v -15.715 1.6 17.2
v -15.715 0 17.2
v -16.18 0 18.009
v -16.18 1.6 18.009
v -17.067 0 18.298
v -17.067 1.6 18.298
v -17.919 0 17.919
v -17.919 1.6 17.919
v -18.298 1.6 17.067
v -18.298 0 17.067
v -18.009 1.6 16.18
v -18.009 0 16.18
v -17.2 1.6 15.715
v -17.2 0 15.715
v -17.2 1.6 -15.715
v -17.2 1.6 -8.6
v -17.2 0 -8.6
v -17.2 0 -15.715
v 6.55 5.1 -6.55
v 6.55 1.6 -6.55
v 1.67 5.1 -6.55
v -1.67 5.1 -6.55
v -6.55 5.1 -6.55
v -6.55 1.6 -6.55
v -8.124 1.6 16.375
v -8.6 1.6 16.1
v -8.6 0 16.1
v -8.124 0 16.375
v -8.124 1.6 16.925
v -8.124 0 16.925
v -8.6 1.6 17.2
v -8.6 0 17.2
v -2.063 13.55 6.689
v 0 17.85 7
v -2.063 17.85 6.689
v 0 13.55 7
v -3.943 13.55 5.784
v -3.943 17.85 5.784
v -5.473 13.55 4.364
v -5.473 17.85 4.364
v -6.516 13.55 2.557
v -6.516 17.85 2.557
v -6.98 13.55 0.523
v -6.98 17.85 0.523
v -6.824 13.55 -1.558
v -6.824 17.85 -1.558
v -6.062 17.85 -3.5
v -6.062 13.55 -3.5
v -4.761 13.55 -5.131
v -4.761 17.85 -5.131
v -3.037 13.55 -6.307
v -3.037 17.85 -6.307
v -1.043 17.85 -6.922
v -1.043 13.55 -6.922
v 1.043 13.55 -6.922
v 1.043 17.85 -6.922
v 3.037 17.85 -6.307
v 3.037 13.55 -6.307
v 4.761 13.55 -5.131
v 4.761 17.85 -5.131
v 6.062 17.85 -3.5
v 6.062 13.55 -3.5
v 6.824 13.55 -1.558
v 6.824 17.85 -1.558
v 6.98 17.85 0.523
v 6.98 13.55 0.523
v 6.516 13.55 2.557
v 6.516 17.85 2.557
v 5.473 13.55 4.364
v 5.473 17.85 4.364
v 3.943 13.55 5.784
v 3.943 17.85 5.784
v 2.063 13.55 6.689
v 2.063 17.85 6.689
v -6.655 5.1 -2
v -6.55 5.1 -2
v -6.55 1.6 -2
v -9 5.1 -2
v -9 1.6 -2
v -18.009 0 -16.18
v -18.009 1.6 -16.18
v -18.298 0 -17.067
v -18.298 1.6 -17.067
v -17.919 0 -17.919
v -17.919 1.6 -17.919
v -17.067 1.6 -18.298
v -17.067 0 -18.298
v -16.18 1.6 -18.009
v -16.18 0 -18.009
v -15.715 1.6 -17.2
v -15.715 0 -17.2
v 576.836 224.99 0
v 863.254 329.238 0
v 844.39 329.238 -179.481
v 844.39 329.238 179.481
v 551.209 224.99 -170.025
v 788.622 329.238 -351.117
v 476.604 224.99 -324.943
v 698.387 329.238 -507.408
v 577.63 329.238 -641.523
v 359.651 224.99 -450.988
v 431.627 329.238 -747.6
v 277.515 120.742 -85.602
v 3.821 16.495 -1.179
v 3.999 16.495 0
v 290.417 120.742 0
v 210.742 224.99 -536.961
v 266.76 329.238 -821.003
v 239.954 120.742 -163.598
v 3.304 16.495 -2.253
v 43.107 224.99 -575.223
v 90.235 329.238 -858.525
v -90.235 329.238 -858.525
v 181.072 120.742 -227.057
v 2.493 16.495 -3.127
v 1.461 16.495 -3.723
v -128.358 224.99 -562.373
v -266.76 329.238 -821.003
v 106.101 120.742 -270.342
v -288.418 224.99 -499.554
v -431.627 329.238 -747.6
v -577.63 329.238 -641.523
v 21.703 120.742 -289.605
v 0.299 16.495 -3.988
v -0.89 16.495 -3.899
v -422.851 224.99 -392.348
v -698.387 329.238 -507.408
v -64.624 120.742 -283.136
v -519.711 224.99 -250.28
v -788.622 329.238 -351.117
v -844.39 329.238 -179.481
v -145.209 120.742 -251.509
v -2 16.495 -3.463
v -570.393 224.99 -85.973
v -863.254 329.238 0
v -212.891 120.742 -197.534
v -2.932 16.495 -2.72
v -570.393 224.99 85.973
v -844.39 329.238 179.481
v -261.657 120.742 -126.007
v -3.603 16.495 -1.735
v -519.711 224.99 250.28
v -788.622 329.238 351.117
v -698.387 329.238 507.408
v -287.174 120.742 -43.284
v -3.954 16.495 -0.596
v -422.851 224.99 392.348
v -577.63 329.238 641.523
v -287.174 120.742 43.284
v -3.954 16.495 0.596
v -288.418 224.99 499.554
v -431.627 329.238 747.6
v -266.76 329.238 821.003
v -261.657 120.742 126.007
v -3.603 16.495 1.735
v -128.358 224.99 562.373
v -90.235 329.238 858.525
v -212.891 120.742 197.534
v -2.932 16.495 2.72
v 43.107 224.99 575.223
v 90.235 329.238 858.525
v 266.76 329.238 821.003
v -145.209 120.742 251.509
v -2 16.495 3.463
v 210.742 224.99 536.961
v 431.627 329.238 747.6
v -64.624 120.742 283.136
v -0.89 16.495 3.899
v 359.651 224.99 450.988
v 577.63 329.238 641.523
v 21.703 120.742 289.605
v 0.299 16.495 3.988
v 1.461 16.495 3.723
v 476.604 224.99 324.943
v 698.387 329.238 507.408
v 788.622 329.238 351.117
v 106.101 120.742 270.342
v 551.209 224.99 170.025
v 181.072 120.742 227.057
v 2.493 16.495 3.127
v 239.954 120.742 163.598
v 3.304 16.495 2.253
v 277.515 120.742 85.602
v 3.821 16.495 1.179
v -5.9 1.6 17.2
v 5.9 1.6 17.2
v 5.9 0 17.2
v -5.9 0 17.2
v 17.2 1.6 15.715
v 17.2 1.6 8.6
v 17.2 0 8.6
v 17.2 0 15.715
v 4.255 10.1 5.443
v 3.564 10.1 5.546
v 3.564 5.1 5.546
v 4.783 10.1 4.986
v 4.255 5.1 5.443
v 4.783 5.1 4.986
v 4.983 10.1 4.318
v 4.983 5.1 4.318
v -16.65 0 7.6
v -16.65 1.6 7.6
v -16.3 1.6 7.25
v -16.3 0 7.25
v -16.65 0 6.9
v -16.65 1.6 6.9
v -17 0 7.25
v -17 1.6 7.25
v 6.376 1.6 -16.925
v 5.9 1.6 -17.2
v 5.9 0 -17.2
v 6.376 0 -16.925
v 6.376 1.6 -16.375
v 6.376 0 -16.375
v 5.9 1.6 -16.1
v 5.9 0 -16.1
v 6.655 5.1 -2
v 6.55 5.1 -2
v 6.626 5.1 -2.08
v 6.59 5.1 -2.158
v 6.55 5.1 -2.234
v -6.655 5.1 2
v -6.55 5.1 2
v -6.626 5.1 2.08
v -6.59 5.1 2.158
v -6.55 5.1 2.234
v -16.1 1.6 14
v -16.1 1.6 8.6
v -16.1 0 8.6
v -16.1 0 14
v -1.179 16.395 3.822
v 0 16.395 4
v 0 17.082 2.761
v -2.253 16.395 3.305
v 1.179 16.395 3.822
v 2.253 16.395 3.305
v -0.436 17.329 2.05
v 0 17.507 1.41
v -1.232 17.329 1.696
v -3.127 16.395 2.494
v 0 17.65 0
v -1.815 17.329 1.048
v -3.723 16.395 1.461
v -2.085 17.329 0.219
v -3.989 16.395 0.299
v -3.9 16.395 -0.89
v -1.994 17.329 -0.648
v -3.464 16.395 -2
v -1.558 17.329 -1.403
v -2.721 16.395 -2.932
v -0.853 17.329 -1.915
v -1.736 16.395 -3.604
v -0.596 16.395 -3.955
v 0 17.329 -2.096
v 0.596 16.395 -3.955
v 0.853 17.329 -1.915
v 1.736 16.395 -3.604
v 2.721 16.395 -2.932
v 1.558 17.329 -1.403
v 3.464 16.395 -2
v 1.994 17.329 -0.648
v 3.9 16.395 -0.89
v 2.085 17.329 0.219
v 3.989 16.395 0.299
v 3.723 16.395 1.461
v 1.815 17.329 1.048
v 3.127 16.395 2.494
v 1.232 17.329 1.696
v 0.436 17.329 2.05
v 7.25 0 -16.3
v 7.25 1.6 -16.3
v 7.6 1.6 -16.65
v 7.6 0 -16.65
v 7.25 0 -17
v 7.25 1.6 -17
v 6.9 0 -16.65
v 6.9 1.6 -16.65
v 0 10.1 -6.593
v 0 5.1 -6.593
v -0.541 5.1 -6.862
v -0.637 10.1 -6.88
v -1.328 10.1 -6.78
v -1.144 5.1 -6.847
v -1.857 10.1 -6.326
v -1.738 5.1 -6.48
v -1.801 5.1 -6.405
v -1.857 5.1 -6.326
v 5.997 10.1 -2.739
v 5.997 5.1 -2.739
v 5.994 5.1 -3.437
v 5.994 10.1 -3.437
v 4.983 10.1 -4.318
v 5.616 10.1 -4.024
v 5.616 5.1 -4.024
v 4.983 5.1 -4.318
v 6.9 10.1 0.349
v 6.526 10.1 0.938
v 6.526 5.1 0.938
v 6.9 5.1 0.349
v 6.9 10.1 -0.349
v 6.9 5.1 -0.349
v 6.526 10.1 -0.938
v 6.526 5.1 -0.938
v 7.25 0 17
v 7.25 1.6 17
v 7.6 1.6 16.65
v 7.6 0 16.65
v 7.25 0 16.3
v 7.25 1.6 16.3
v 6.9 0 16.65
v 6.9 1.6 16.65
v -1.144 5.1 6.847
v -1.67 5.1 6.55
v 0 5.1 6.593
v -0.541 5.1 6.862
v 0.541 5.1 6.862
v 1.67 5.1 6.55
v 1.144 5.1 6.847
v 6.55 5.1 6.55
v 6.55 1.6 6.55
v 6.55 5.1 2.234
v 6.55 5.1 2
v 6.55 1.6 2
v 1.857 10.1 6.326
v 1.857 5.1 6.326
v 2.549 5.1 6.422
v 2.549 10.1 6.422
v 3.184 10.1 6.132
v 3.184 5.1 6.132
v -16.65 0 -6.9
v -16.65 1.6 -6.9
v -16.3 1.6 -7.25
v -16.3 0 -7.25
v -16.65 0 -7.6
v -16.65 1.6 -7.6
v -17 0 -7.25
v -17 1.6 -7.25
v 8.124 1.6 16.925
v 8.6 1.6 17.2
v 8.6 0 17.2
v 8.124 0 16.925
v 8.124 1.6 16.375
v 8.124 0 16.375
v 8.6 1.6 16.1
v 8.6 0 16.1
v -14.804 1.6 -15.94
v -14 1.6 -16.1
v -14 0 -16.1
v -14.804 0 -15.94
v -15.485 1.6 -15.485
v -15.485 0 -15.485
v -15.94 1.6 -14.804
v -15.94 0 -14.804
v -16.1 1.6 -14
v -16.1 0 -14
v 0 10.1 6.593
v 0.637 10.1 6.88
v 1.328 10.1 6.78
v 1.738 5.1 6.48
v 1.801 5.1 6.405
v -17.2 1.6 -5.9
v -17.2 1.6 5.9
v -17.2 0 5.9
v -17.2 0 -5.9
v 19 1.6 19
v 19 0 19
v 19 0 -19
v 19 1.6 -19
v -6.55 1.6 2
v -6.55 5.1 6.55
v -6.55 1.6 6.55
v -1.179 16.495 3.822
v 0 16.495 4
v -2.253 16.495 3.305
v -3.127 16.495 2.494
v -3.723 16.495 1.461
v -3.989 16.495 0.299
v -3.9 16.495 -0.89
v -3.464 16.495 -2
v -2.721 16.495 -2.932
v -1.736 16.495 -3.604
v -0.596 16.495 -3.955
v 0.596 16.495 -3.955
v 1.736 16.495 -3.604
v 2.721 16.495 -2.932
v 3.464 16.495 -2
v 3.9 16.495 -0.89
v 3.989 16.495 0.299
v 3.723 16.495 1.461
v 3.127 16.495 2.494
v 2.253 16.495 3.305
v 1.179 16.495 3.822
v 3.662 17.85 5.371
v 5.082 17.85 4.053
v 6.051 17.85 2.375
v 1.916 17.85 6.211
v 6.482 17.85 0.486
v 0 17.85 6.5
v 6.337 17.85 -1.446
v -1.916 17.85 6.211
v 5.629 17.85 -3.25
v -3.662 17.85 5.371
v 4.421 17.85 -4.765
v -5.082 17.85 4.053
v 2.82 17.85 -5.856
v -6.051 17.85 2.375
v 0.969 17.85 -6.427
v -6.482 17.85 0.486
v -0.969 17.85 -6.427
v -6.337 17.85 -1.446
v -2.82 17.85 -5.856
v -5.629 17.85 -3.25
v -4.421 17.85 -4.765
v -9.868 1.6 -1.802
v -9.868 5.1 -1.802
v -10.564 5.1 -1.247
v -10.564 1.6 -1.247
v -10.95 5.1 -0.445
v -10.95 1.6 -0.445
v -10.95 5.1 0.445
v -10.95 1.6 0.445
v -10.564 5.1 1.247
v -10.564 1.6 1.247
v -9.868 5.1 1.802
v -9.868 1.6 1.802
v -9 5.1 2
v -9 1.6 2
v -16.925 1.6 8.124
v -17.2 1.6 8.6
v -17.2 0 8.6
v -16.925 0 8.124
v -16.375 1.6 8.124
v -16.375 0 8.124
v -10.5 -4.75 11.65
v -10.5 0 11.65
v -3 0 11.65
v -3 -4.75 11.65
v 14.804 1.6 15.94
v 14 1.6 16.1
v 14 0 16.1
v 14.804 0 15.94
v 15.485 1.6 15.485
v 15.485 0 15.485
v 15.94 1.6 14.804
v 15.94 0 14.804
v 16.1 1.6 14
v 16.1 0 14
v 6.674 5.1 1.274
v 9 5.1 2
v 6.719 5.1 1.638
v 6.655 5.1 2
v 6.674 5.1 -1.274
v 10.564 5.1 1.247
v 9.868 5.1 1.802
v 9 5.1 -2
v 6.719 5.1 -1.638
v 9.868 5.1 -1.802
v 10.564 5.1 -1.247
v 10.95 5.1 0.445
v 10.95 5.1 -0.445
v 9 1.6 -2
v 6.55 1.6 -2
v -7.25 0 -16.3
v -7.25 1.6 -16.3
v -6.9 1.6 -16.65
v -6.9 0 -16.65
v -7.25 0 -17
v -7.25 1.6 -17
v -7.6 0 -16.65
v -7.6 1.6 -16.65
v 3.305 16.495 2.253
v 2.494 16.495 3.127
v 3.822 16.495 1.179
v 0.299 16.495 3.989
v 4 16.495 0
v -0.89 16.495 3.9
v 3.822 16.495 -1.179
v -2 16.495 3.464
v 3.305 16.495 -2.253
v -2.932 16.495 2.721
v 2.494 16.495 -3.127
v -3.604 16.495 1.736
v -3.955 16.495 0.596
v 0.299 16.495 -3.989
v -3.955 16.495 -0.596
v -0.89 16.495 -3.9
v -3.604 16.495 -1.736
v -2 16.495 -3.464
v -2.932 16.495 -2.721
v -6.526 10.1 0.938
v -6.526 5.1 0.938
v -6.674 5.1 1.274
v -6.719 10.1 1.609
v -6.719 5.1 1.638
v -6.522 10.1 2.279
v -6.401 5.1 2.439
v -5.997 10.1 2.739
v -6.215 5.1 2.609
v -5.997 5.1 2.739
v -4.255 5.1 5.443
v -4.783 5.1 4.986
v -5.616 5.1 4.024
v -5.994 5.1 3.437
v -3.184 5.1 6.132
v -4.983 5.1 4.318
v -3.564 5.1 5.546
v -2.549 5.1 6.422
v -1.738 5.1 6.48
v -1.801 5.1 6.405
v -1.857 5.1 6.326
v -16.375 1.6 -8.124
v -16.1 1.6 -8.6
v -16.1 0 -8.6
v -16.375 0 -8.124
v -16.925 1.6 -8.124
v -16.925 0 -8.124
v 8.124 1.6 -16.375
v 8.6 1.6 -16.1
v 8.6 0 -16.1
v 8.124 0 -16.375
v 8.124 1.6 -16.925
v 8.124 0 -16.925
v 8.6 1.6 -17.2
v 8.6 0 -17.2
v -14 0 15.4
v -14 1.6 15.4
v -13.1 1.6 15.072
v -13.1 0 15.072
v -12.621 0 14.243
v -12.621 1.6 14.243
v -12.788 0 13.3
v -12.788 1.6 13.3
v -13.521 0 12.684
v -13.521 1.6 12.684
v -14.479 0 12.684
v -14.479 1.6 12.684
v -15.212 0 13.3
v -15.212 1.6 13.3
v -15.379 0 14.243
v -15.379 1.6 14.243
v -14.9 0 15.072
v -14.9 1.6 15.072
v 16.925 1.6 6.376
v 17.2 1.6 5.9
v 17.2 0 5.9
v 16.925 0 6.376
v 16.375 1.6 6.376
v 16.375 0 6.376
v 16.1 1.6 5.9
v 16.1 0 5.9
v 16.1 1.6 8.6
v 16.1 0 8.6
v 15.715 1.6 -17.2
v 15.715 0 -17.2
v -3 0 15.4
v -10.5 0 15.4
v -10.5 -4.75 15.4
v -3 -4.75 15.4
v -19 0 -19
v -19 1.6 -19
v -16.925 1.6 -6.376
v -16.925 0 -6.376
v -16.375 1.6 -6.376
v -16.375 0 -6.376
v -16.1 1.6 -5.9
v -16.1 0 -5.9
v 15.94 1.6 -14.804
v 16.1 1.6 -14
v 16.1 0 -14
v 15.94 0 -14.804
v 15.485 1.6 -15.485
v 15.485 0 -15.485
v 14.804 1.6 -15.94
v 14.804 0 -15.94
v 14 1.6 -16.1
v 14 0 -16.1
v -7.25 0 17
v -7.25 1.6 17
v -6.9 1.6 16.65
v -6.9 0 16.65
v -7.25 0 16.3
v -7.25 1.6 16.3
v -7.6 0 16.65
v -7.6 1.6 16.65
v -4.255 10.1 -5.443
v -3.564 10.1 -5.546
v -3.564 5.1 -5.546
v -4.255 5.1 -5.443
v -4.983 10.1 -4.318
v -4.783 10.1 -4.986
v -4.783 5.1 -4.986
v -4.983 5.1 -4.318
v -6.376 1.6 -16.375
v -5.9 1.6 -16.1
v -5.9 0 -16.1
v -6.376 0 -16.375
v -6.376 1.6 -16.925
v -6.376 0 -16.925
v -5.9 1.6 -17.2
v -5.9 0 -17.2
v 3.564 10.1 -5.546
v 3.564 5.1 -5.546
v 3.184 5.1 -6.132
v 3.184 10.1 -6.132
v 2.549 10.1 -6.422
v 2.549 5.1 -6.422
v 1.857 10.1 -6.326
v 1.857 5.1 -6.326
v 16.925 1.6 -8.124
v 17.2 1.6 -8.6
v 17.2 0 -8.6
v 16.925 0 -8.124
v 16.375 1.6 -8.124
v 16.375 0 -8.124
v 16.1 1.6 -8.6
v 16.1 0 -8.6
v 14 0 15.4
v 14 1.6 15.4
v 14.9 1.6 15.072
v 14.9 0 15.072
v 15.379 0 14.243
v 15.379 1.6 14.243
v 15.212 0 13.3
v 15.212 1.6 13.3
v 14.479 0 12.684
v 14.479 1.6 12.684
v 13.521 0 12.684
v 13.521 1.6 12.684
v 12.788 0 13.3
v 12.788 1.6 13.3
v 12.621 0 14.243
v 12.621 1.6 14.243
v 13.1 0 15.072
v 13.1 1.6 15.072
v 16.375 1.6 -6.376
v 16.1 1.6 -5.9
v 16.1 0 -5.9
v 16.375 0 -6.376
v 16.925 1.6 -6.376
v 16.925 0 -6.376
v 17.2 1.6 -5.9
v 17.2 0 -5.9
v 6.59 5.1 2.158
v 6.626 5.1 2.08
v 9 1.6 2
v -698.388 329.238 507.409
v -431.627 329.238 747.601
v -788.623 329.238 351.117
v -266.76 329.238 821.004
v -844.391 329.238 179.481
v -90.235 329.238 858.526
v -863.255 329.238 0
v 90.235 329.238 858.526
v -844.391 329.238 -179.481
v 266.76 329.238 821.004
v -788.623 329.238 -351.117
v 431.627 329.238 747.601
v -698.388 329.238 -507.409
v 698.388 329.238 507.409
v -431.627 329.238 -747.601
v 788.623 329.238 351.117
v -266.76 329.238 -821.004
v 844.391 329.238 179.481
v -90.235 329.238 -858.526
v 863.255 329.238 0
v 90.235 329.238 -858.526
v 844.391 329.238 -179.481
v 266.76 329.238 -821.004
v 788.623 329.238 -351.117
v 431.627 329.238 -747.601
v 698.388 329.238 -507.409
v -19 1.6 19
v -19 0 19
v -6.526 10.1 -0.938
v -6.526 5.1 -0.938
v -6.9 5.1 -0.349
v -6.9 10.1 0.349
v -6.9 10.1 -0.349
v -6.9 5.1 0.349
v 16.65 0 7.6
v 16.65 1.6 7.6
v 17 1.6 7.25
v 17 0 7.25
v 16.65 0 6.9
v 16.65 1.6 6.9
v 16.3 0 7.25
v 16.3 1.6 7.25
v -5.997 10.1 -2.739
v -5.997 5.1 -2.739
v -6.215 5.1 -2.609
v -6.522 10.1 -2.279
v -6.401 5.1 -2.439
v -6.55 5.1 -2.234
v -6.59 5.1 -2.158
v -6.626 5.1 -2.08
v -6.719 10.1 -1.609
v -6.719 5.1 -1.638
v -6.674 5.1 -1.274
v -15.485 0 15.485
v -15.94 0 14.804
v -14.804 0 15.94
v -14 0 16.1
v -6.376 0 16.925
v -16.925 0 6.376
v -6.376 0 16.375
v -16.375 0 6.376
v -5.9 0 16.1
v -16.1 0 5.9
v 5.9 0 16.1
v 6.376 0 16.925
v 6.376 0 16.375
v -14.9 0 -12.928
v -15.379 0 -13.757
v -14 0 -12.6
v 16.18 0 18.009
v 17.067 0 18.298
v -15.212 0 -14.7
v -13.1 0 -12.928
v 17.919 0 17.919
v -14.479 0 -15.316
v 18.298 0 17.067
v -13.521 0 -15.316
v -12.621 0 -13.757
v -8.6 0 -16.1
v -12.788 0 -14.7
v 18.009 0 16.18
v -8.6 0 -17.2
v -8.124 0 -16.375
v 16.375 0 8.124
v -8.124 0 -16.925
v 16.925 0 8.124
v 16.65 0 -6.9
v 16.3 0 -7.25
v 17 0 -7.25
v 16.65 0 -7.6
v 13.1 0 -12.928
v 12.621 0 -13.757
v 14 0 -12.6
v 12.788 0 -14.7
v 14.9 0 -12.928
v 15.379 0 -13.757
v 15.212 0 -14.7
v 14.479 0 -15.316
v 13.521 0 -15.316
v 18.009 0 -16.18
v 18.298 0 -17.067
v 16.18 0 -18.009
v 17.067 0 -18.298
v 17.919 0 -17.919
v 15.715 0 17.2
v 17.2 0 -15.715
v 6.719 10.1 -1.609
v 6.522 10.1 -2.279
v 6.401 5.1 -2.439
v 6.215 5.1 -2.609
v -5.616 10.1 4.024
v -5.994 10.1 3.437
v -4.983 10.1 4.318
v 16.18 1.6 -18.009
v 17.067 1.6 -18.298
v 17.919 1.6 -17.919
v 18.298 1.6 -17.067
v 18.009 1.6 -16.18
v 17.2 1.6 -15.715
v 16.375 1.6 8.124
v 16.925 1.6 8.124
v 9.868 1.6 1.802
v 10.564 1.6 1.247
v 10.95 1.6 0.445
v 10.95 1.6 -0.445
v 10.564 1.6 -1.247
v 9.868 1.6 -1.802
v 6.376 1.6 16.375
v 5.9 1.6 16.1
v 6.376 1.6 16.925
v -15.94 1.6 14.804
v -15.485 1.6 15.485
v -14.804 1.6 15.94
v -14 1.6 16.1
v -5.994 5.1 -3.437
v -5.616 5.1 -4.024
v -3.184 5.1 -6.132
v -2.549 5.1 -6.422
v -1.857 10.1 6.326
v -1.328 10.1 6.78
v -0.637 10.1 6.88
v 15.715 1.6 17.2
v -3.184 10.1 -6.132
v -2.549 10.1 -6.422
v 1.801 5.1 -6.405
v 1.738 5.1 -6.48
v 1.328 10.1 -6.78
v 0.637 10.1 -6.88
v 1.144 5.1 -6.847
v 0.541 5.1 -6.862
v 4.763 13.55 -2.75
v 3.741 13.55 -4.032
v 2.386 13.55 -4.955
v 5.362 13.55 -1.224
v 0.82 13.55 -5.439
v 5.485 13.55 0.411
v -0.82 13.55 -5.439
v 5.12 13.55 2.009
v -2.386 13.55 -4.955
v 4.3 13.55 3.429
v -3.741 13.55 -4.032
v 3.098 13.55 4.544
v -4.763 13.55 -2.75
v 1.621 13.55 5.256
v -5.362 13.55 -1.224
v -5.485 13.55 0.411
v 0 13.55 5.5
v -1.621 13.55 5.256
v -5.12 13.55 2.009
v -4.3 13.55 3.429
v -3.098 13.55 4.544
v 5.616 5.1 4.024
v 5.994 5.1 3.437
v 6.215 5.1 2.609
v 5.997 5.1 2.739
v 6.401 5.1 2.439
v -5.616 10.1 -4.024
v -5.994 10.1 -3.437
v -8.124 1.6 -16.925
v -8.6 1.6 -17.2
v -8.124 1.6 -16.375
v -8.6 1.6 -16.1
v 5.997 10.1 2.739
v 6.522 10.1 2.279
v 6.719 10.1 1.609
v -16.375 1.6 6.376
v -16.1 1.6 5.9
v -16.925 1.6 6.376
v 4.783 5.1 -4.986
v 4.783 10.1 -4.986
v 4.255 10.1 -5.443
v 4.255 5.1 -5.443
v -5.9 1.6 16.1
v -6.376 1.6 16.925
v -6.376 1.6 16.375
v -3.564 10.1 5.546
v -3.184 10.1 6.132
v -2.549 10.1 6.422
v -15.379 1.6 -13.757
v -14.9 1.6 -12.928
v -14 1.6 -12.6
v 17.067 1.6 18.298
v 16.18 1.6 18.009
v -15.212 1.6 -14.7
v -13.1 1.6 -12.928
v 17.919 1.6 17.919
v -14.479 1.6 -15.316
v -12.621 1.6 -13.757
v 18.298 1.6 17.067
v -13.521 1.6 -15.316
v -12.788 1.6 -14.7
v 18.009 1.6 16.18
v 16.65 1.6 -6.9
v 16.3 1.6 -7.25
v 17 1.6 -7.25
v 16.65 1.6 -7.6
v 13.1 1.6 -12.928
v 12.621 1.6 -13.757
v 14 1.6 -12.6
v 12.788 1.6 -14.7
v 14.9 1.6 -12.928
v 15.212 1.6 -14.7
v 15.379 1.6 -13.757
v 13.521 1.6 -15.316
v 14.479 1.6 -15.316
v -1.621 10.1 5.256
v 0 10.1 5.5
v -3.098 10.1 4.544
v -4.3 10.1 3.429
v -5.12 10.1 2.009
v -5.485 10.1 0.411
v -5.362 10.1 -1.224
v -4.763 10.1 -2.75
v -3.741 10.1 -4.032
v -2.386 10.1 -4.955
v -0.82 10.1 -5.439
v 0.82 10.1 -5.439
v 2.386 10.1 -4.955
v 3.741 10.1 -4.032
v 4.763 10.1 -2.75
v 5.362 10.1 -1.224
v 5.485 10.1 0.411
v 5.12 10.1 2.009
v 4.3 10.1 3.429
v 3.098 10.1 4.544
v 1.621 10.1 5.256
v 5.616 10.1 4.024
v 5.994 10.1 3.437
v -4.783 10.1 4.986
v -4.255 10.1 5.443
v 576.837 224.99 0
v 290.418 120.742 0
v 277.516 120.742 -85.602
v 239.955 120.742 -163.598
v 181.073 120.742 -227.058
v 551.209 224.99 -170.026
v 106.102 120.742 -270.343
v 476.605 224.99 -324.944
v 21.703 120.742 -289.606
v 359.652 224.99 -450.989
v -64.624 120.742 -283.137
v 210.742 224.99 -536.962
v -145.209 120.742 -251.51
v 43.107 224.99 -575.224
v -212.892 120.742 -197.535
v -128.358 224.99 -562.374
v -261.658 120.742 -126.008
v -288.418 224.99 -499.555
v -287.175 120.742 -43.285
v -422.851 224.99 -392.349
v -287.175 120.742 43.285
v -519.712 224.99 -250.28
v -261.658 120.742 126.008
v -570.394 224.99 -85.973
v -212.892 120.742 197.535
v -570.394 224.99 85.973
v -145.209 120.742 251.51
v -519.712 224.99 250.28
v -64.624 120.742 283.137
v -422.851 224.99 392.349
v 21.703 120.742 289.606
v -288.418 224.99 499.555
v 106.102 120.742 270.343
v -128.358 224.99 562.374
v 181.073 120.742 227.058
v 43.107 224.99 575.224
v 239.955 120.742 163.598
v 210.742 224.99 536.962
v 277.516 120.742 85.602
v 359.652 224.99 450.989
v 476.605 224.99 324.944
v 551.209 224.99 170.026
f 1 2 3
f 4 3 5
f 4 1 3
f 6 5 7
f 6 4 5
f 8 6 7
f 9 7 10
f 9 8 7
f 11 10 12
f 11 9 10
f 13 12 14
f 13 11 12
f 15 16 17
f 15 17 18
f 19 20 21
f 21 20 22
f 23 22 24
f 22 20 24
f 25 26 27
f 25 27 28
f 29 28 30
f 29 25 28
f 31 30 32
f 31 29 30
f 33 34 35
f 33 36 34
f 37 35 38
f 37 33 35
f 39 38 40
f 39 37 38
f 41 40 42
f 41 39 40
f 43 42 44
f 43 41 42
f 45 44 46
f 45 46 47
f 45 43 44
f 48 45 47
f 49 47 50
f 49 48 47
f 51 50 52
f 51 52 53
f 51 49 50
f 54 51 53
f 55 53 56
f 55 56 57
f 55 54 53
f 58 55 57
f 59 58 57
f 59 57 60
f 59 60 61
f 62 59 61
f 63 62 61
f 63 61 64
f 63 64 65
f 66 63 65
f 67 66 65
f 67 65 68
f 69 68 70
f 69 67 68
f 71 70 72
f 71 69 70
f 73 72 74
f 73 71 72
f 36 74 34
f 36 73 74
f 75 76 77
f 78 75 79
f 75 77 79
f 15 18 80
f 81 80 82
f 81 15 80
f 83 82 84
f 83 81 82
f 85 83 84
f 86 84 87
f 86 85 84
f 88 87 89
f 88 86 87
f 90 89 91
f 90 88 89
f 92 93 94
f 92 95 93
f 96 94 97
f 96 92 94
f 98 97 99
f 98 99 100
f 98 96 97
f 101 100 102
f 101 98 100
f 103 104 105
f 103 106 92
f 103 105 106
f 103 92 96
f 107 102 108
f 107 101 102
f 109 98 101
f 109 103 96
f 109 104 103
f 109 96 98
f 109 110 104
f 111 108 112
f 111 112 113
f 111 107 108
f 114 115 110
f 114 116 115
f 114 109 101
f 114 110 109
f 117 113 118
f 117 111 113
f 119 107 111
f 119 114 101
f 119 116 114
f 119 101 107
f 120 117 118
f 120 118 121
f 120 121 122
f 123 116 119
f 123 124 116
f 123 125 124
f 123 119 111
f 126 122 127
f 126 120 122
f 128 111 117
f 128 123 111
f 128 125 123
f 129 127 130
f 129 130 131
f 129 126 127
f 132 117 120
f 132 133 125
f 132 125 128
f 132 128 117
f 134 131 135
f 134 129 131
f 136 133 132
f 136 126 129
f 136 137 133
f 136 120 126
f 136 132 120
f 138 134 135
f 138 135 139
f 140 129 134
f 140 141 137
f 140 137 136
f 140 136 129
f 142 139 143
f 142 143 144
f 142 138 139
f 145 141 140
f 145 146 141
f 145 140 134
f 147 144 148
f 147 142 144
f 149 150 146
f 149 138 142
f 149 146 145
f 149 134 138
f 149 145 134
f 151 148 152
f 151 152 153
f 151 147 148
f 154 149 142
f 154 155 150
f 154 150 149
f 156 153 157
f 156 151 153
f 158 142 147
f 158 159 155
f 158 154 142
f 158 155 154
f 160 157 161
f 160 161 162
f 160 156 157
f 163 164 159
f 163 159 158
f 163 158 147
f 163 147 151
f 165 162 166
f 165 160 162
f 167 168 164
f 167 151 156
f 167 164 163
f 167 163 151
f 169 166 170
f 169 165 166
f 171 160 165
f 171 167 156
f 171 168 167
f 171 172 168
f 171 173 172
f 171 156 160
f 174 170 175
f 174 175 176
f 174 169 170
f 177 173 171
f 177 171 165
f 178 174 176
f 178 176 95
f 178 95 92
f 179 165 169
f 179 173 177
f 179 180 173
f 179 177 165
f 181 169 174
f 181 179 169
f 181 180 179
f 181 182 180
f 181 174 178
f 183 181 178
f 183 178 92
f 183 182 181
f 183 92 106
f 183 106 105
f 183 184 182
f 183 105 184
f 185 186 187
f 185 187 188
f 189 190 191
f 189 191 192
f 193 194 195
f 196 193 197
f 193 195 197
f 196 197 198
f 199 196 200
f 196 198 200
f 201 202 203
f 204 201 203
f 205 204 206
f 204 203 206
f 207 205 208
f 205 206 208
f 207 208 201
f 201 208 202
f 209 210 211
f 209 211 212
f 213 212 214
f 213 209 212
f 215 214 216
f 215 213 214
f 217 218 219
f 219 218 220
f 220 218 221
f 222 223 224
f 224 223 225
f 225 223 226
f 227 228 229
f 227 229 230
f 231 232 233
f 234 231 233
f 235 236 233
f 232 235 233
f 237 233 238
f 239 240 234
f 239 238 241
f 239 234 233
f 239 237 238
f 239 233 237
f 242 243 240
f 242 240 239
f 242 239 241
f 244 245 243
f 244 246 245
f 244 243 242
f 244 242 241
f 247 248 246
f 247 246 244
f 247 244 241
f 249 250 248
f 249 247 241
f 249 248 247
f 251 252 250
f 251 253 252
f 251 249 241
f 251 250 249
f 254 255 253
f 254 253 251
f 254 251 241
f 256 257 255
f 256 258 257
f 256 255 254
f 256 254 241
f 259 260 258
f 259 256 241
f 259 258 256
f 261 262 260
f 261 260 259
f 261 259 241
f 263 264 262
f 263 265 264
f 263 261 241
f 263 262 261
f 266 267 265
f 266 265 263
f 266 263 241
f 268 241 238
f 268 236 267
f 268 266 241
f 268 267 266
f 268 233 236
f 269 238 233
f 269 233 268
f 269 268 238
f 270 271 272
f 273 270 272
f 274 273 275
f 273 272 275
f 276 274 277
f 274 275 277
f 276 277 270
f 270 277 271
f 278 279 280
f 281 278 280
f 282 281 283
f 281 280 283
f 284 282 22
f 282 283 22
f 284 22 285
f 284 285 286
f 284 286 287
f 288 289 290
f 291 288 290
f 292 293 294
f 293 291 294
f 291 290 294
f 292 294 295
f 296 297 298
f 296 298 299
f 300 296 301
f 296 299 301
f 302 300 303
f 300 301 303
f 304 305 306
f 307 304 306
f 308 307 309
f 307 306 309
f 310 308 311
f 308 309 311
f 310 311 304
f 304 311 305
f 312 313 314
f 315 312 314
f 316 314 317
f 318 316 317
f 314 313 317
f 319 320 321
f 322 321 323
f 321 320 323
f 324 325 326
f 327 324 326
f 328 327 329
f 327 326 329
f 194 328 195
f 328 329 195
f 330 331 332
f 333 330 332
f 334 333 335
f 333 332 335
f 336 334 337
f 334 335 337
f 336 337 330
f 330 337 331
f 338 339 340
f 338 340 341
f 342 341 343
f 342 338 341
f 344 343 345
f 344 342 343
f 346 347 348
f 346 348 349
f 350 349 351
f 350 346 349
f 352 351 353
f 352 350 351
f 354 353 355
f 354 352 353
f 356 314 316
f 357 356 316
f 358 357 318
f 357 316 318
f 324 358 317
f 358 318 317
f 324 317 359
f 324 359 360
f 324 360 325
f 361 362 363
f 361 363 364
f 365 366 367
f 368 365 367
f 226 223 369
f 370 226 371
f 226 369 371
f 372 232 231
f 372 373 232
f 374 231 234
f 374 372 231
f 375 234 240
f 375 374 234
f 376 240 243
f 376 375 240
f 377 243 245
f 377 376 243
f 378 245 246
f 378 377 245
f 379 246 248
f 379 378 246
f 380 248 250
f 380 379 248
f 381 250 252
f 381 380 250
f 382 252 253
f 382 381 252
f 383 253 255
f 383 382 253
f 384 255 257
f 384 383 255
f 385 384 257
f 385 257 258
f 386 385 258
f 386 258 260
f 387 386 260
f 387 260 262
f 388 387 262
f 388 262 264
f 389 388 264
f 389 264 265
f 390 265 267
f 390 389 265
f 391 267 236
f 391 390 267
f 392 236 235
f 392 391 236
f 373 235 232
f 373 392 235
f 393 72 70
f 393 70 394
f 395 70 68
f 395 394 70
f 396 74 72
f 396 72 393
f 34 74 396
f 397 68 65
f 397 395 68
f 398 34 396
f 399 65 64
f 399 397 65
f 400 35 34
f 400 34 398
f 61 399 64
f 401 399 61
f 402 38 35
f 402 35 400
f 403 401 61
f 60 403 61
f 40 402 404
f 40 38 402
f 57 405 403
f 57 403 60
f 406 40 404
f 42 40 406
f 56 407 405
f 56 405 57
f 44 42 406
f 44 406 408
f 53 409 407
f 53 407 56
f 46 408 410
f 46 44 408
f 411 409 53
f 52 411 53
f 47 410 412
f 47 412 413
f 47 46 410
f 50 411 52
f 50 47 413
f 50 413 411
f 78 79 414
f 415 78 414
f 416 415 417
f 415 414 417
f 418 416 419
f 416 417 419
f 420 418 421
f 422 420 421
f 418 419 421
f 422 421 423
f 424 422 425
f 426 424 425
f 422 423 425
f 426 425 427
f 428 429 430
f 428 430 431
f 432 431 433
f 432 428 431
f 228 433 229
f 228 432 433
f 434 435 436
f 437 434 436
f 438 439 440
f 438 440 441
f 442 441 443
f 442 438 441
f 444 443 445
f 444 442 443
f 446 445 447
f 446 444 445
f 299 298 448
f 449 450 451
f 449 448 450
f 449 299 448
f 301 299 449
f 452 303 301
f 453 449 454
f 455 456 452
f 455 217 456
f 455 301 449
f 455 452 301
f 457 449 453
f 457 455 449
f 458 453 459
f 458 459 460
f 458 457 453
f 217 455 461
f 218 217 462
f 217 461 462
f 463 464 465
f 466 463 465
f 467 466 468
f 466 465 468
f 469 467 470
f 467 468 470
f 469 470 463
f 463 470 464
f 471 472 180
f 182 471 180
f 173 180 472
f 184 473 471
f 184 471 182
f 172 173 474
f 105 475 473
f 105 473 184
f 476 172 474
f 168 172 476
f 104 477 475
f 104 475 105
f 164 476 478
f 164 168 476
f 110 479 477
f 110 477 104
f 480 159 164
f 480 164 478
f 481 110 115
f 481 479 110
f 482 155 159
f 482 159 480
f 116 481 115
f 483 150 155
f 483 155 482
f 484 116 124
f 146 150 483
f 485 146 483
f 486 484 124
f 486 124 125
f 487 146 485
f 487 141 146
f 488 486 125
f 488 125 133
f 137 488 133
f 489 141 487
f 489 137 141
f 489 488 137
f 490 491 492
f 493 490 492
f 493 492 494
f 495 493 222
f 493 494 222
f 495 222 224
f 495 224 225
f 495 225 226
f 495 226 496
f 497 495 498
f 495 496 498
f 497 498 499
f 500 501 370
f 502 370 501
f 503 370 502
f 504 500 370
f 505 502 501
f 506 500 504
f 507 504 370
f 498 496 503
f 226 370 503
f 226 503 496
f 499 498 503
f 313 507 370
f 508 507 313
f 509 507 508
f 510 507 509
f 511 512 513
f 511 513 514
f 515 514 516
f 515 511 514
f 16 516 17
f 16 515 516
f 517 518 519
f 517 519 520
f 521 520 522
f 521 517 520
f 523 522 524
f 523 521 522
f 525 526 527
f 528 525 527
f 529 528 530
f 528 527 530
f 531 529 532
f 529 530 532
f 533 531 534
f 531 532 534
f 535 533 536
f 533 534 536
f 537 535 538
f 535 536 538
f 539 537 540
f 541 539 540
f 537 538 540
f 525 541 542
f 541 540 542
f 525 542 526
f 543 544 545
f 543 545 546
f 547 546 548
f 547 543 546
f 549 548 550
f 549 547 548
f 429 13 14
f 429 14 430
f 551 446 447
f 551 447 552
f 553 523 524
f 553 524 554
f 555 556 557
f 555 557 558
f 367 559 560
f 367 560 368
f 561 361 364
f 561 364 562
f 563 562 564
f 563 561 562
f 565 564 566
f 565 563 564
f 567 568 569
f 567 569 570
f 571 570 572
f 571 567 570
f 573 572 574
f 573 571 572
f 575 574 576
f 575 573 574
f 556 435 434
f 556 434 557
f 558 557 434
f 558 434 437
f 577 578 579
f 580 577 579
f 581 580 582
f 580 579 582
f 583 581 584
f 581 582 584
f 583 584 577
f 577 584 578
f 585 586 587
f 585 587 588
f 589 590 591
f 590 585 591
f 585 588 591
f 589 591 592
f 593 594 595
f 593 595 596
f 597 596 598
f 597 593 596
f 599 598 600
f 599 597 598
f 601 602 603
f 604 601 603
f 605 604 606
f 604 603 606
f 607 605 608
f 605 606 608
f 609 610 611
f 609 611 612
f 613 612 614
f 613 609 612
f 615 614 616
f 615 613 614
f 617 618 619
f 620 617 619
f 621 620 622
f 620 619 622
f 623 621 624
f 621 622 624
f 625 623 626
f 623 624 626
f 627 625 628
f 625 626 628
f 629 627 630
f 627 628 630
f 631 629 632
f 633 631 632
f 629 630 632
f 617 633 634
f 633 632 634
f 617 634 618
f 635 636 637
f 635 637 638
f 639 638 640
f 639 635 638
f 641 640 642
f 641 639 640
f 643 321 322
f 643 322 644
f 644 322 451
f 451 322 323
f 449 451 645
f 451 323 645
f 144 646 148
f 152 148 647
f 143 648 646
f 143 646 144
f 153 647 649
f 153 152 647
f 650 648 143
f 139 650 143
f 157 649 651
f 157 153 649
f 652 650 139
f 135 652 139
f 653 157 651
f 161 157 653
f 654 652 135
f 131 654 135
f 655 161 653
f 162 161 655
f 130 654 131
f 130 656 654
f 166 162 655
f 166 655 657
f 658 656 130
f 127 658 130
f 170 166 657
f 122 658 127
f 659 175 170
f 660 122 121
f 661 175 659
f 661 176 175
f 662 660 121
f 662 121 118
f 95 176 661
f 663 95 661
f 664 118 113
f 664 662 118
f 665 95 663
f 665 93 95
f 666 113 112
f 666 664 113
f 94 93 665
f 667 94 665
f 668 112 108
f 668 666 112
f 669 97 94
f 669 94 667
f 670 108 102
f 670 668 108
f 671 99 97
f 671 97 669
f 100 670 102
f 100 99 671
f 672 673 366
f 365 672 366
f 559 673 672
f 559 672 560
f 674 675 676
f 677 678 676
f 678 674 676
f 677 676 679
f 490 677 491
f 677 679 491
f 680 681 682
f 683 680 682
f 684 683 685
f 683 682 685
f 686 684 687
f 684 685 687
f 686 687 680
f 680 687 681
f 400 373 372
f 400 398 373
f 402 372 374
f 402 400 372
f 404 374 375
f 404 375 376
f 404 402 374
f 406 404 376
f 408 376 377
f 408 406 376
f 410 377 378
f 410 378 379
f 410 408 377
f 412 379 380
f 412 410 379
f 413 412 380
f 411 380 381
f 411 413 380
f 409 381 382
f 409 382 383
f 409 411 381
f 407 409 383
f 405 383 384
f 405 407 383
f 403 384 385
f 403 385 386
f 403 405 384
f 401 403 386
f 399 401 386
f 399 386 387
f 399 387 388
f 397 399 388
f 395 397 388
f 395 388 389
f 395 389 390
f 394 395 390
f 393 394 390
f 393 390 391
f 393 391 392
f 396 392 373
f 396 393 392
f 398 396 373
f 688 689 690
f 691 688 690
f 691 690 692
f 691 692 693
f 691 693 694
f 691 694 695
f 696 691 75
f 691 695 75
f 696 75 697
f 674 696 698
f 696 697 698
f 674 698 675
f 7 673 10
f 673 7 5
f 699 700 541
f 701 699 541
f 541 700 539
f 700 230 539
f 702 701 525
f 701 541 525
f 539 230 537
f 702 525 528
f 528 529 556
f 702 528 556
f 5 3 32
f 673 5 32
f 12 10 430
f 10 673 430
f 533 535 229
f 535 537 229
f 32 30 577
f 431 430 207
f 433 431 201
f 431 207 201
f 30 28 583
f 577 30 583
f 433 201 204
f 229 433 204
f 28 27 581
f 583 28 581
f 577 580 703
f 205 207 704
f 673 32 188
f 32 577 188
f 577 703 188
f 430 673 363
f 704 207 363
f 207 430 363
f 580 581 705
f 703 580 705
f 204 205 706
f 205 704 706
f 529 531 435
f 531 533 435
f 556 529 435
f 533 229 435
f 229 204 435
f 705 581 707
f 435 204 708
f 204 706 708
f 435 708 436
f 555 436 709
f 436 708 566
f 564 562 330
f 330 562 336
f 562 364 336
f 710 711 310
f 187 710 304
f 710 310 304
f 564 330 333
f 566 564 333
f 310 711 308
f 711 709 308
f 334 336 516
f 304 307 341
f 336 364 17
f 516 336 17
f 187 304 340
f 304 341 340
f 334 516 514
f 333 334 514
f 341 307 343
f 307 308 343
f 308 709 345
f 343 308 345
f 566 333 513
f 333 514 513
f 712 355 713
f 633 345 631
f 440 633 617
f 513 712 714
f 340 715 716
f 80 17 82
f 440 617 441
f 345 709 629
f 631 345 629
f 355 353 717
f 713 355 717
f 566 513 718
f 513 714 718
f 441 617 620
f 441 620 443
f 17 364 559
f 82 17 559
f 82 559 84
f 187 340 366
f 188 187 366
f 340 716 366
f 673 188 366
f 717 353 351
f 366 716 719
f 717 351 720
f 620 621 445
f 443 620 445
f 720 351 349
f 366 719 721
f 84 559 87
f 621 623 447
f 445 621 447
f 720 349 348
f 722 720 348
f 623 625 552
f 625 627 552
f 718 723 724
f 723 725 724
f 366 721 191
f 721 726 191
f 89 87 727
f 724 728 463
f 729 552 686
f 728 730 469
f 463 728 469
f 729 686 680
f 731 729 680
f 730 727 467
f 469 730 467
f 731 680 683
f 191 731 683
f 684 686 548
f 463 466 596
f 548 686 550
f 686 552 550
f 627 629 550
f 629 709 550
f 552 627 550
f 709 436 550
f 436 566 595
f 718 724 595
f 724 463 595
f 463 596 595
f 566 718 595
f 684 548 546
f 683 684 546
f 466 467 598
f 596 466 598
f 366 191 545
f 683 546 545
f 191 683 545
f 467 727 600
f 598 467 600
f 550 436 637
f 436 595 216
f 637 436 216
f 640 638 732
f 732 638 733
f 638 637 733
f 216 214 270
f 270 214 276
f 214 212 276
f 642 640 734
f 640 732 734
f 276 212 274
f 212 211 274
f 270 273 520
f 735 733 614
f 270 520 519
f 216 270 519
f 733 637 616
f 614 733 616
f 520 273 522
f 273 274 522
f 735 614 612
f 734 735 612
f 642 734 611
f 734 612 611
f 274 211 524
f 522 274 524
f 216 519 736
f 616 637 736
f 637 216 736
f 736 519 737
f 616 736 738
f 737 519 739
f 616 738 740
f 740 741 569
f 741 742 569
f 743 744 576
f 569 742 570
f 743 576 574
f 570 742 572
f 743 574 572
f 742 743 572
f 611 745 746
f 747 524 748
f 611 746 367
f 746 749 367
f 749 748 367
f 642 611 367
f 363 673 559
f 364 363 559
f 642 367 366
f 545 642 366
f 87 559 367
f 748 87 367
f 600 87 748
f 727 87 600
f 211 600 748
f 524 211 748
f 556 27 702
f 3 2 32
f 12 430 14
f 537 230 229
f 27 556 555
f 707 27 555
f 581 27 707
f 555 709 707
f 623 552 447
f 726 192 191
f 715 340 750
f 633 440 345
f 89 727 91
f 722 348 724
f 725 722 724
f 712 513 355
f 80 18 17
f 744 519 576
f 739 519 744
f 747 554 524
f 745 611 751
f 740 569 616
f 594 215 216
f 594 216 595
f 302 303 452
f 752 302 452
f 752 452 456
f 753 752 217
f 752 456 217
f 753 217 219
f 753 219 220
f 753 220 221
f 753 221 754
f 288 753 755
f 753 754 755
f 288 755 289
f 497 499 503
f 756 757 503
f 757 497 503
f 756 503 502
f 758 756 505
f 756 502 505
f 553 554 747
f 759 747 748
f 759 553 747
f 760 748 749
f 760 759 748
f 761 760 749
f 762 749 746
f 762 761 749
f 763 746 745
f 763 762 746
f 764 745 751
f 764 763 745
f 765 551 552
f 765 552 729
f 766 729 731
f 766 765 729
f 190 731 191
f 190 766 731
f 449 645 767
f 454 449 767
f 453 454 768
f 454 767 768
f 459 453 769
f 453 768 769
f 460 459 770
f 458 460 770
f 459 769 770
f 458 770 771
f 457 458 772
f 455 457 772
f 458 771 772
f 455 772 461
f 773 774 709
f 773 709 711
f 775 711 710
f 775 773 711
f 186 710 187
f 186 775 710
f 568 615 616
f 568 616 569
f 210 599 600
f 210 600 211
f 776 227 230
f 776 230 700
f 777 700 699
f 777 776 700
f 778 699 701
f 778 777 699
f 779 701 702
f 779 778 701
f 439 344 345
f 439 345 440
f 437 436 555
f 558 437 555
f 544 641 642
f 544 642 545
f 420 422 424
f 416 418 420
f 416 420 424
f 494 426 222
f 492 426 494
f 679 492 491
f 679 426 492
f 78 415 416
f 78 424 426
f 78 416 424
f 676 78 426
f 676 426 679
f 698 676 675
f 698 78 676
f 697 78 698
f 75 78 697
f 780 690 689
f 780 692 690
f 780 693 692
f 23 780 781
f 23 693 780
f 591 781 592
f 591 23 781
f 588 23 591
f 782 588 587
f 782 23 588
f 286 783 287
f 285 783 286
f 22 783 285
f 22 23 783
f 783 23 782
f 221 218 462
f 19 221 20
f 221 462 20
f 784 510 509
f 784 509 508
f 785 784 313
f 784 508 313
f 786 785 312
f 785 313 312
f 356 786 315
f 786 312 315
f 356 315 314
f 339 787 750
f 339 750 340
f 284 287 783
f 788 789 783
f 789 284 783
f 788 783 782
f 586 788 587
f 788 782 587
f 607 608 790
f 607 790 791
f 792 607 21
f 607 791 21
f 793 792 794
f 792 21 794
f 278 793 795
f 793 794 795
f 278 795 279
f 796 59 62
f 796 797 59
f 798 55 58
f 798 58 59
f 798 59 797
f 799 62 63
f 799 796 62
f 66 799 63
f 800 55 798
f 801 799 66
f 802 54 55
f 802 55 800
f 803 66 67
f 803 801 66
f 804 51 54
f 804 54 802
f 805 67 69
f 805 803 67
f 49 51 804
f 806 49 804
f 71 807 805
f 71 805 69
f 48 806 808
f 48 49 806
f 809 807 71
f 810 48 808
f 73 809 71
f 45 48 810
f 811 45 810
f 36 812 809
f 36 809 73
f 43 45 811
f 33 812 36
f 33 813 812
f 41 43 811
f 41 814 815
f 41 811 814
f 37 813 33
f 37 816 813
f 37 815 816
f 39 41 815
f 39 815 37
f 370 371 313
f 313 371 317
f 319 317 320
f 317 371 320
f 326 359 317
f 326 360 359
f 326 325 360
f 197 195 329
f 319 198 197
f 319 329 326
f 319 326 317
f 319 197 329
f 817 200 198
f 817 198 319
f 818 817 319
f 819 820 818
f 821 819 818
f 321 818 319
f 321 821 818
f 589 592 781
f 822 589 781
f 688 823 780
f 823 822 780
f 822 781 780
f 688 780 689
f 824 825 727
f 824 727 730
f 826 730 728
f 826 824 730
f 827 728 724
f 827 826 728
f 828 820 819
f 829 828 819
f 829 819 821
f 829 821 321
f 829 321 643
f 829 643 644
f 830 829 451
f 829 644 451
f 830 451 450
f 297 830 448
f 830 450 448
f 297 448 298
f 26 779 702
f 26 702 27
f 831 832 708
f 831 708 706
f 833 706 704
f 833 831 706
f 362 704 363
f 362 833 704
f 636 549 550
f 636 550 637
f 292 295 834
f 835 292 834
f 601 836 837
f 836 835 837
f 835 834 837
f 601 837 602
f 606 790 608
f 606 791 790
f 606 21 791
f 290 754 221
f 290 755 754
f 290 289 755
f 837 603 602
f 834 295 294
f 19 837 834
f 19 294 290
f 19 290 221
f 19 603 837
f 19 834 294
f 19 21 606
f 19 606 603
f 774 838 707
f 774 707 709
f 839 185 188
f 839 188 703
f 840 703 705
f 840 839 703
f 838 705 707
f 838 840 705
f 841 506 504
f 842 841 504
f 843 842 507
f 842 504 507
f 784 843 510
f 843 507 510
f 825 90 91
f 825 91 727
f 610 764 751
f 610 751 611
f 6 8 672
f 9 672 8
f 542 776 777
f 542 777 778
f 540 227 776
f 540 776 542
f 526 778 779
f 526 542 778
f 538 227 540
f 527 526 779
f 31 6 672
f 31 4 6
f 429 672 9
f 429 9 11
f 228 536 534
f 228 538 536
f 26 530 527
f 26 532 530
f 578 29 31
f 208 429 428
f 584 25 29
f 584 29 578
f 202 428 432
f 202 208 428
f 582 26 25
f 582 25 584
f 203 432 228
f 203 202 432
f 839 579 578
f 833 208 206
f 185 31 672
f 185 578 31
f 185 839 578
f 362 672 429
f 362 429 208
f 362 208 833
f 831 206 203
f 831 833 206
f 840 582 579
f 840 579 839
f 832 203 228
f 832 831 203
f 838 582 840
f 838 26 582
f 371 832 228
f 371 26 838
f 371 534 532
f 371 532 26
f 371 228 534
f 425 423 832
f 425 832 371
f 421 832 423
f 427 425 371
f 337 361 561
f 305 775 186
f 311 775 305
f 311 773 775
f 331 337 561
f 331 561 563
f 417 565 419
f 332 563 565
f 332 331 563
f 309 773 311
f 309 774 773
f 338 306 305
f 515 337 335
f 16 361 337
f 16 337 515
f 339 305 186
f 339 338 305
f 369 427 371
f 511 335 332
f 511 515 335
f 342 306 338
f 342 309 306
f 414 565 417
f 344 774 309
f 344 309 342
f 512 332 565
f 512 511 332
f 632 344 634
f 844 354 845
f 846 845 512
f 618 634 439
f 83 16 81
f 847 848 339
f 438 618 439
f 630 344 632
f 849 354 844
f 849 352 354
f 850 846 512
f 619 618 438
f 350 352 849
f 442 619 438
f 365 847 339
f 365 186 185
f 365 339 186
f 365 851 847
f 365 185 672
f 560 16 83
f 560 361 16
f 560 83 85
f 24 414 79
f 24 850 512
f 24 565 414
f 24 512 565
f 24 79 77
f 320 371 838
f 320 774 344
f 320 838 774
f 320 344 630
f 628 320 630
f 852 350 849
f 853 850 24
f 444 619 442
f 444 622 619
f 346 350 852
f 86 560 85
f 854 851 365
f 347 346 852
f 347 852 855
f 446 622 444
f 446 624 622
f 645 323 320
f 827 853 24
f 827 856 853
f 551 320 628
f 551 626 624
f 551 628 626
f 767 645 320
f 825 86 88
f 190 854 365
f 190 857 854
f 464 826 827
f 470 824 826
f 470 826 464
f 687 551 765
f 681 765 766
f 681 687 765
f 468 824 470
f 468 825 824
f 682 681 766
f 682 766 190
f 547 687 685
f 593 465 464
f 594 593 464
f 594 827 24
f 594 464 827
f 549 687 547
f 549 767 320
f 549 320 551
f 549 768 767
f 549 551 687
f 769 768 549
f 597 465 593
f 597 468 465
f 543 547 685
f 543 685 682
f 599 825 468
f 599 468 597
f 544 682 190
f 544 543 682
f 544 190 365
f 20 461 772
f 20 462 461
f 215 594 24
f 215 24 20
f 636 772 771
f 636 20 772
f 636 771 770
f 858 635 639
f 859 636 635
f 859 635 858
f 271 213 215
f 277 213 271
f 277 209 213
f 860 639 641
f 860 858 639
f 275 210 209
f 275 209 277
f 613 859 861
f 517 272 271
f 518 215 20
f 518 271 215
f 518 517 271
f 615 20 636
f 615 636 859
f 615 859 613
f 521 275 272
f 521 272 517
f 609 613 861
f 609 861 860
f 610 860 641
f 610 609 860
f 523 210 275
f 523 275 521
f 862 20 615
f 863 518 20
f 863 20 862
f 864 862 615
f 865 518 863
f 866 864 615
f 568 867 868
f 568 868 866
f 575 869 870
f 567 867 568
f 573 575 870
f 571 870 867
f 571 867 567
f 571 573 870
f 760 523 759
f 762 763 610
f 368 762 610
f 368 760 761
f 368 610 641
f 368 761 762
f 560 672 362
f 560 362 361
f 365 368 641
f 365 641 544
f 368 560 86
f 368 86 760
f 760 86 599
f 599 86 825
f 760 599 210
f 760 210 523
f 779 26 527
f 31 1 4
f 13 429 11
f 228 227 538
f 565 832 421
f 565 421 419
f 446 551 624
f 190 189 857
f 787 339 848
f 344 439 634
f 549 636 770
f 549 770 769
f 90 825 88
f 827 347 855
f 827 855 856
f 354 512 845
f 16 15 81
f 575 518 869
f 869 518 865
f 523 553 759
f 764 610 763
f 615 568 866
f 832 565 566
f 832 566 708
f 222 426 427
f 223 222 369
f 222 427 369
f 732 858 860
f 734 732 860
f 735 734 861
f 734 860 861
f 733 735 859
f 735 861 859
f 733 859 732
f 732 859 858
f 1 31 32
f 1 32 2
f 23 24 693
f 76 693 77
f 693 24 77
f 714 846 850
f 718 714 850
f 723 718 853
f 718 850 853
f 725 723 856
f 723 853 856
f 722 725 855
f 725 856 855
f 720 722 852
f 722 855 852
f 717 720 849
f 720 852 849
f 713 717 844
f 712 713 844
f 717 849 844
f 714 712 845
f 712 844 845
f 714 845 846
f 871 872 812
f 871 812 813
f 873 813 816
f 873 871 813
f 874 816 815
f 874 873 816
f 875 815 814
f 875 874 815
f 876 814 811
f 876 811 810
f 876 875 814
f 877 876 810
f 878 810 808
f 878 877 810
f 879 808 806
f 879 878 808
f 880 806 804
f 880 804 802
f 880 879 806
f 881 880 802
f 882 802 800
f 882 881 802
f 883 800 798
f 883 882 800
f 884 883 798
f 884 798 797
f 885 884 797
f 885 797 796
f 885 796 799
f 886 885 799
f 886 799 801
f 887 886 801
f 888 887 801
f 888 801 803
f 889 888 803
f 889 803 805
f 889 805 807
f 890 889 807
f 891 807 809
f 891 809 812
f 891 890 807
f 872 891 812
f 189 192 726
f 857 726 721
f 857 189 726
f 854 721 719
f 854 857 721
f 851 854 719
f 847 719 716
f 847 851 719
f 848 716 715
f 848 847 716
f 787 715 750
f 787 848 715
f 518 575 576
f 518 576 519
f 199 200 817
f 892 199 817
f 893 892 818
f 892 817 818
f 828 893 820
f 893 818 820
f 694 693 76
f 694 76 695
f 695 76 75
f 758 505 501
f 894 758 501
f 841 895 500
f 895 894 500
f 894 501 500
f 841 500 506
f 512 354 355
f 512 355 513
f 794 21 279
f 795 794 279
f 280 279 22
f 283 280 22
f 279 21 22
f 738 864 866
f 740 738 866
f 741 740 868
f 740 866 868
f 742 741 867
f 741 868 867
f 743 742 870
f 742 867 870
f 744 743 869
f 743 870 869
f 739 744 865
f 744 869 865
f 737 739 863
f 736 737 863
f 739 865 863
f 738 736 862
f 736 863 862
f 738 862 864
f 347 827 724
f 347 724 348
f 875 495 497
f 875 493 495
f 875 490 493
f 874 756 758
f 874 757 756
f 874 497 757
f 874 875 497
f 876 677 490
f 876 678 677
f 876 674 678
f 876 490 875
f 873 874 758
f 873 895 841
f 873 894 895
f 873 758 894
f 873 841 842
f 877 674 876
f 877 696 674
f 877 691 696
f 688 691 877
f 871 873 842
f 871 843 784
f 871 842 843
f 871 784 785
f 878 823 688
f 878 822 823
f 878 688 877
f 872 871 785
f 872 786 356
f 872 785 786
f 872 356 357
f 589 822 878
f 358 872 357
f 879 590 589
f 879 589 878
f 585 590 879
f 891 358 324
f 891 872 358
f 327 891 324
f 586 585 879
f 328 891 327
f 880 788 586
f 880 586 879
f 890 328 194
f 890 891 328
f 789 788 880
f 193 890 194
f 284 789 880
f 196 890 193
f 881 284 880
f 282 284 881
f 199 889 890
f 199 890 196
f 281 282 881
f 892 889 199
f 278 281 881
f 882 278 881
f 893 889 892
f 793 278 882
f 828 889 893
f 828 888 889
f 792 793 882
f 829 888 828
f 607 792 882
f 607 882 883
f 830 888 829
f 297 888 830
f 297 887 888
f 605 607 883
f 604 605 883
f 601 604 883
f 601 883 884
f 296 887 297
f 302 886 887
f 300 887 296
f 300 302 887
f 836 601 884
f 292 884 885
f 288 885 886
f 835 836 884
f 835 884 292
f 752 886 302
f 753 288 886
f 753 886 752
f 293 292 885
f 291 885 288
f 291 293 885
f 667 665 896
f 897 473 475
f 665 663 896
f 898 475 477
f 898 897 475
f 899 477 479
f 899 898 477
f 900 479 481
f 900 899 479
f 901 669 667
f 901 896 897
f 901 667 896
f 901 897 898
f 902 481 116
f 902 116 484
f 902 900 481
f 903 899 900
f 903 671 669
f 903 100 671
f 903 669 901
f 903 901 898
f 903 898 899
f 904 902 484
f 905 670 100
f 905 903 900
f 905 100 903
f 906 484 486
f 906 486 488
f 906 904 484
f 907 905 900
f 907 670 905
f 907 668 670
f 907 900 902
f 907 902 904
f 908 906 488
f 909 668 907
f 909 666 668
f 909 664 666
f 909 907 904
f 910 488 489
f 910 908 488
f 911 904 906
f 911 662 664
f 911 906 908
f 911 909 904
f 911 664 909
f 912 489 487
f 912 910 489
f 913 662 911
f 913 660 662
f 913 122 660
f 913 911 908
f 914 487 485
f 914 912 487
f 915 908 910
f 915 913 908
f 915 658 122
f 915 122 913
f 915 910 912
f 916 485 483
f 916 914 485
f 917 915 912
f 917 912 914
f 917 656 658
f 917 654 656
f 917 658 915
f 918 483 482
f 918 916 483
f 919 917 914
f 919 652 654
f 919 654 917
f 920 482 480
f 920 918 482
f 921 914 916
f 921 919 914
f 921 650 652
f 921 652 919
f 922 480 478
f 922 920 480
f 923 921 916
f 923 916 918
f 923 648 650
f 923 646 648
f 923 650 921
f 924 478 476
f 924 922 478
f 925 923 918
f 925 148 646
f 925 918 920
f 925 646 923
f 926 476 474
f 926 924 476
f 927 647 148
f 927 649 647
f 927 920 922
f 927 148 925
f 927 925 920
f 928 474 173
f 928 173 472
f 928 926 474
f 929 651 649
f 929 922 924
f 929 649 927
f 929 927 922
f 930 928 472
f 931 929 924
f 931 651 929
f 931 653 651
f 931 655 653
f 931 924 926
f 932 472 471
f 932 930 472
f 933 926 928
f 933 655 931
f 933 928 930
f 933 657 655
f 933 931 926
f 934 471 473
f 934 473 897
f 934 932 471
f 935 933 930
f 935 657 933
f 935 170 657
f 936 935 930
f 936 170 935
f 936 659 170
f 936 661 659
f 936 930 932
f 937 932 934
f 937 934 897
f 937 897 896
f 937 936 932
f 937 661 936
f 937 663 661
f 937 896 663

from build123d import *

# Parameters (mm, degrees)
SKETCH1_W           = 38
SKETCH1_H           = 38
BOSS_EXTRUDE1_DEPTH = 1.6
BOSS_EXTRUDE2_DEPTH = 3.5
SKETCH3_R           = 1.25
BOSS_EXTRUDE3_DEPTH = 5
CIRPATTERN1_COUNT   = 22
SKETCH5_W           = 7.5
SKETCH5_H           = 3.75
BOSS_EXTRUDE4_DEPTH = 4.75
SKETCH6_R           = 1.4
SKETCH6_R_2         = 0.35
CUT_EXTRUDE1_DEPTH  = 32.401632123


# Read off the part's stored shape, not the designer's step: FOV
with BuildPart() as part:
    # Sketch1 → Boss-Extrude1 (new body)
    with BuildSketch(Plane(origin=(0, 0, 0), x_dir=(1, 0, 0), z_dir=(0, 1, 0))):
        Rectangle(SKETCH1_W, SKETCH1_H)
    extrude(amount=BOSS_EXTRUDE1_DEPTH)

    # Sketch2 → Boss-Extrude2 (add)
    with BuildSketch(Plane(origin=(0, 1.6, 0), x_dir=(1, 0, 0), z_dir=(0, 1, 0))):
        with BuildLine():
            Line((-6.55, 2), (-9, 2))
            ThreePointArc((-9, 2), (-11, 0), (-9, -2))
            Line((-9, -2), (-6.55, -2))
            Line((-6.55, -2), (-6.55, -6.55))
            Line((-6.55, -6.55), (6.55, -6.55))
            Line((6.55, -6.55), (6.55, -2))
            Line((6.55, -2), (9, -2))
            ThreePointArc((9, -2), (11, 0), (9, 2))
            Line((9, 2), (6.55, 2))
            Line((6.55, 2), (6.55, 6.55))
            Line((6.55, 6.55), (-6.55, 6.55))
            Line((-6.55, 6.55), (-6.55, 2))
        make_face()
    extrude(amount=BOSS_EXTRUDE2_DEPTH)

    # Sketch4 → Revolve1 (revolve)
    with BuildSketch(Plane.XY, mode=Mode.PRIVATE) as revolve1_sk:
        with BuildLine():
            Line((0, 0), (0, 17.65))
            ThreePointArc((0, 17.65), (-2.096194346, 17.328770041), (-4, 16.394562647))
            Line((-4, 16.394562647), (-4, 16.494562647))
            Line((-4, 16.494562647), (-6.5, 17.85))
            Line((-6.5, 17.85), (-7, 17.85))
            Line((-7, 17.85), (-7, 13.55))
            Line((-7, 13.55), (-5.5, 13.55))
            Line((-5.5, 13.55), (-5.5, 0))
            Line((-5.5, 0), (0, 0))
        make_face()
    revolve(revolve1_sk.sketch.rotate(Axis((0, 0, 0), (0, -1, 0)), 270), axis=Axis((0, 0, 0), (0, -1, 0)))

    # Sketch3 → Boss-Extrude3 (add)
    with BuildSketch(Plane(origin=(0, 5.1, 0), x_dir=(1, 0, 0), z_dir=(0, 1, 0))):
        with Locations((5.7, 0)):
            Circle(SKETCH3_R)
    boss_extrude3 = extrude(amount=BOSS_EXTRUDE3_DEPTH)

    # CirPattern1: Boss-Extrude3 ×22 about axis
    cirpattern1_axis = Axis((0, 0, 0), (0, 1, 0))
    for i in range(1, CIRPATTERN1_COUNT):
        add(boss_extrude3.rotate(cirpattern1_axis, i * 360 / CIRPATTERN1_COUNT))

    # Sketch5 → Boss-Extrude4 (add)
    with BuildSketch(Plane.XZ):
        with Locations((-6.75, 13.525)):
            Rectangle(SKETCH5_W, SKETCH5_H)
    extrude(amount=BOSS_EXTRUDE4_DEPTH)

    # Sketch6 → Cut-Extrude1 (cut, through all)
    with BuildSketch(Plane(origin=(0, 1.6, 0), x_dir=(1, 0, 0), z_dir=(0, 1, 0))):
        with Locations(Location((-14, 14, 0), (0, 0, 270))):
            Circle(SKETCH6_R)
        with Locations(Location((-7.25, 16.65, 0), (0, 0, 270))):
            Circle(SKETCH6_R_2)
        with Locations(Location((7.25, 16.65, 0), (0, 0, 270))):
            Circle(SKETCH6_R_2)
        with Locations(Location((14, 14, 0), (0, 0, 270))):
            Circle(SKETCH6_R)
        with Locations(Location((16.65, 7.25, 0), (0, 0, 270))):
            Circle(SKETCH6_R_2)
        with Locations(Location((16.65, -7.25, 0), (0, 0, 270))):
            Circle(SKETCH6_R_2)
        with Locations(Location((14, -14, 0), (0, 0, 270))):
            Circle(SKETCH6_R)
        with Locations(Location((7.25, -16.65, 0), (0, 0, 270))):
            Circle(SKETCH6_R_2)
        with Locations(Location((-7.25, -16.65, 0), (0, 0, 270))):
            Circle(SKETCH6_R_2)
        with Locations(Location((-14, -14, 0), (0, 0, 270))):
            Circle(SKETCH6_R)
        with Locations(Location((-16.65, -7.25, 0), (0, 0, 270))):
            Circle(SKETCH6_R_2)
        with Locations(Location((-16.65, 7.25, 0), (0, 0, 270))):
            Circle(SKETCH6_R_2)
        with BuildLine():
            Line((-15.715476742, 17.2), (-8.6, 17.2))
            ThreePointArc((-8.6, 17.2), (-8.05, 16.65), (-8.6, 16.1))
            Line((-8.6, 16.1), (-14, 16.1))
            ThreePointArc((-14, 16.1), (-15.48492424, 15.48492424), (-16.1, 14))
            Line((-16.1, 14), (-16.1, 8.6))
            ThreePointArc((-16.1, 8.6), (-16.65, 8.05), (-17.2, 8.6))
            Line((-17.2, 8.6), (-17.2, 15.715476742))
            ThreePointArc((-17.2, 15.715476742), (-17.919238816, 17.919238816), (-15.715476742, 17.2))
        make_face()
        with BuildLine():
            Line((-5.9, 17.2), (5.9, 17.2))
            ThreePointArc((5.9, 17.2), (6.45, 16.65), (5.9, 16.1))
            Line((5.9, 16.1), (-5.9, 16.1))
            ThreePointArc((-5.9, 16.1), (-6.45, 16.65), (-5.9, 17.2))
        make_face()
        with BuildLine():
            Line((14, 16.1), (8.6, 16.1))
            ThreePointArc((8.6, 16.1), (8.05, 16.65), (8.6, 17.2))
            Line((8.6, 17.2), (15.715476742, 17.2))
            ThreePointArc((15.715476742, 17.2), (17.919238816, 17.919238816), (17.2, 15.715476742))
            Line((17.2, 15.715476742), (17.2, 8.6))
            ThreePointArc((17.2, 8.6), (16.65, 8.05), (16.1, 8.6))
            Line((16.1, 8.6), (16.1, 14))
            ThreePointArc((16.1, 14), (15.48492424, 15.48492424), (14, 16.1))
        make_face()
        with BuildLine():
            Line((16.1, -5.9), (16.1, 5.9))
            ThreePointArc((16.1, 5.9), (16.65, 6.45), (17.2, 5.9))
            Line((17.2, 5.9), (17.2, -5.9))
            ThreePointArc((17.2, -5.9), (16.65, -6.45), (16.1, -5.9))
        make_face()
        with BuildLine():
            Line((16.1, -14), (16.1, -8.6))
            ThreePointArc((16.1, -8.6), (16.65, -8.05), (17.2, -8.6))
            Line((17.2, -8.6), (17.2, -15.715476742))
            ThreePointArc((17.2, -15.715476742), (17.919238816, -17.919238816), (15.715476742, -17.2))
            Line((15.715476742, -17.2), (8.6, -17.2))
            ThreePointArc((8.6, -17.2), (8.05, -16.65), (8.6, -16.1))
            Line((8.6, -16.1), (14, -16.1))
            ThreePointArc((14, -16.1), (15.48492424, -15.48492424), (16.1, -14))
        make_face()
        with BuildLine():
            Line((-5.9, -16.1), (5.9, -16.1))
            ThreePointArc((5.9, -16.1), (6.45, -16.65), (5.9, -17.2))
            Line((5.9, -17.2), (-5.9, -17.2))
            ThreePointArc((-5.9, -17.2), (-6.45, -16.65), (-5.9, -16.1))
        make_face()
        with BuildLine():
            Line((-14, -16.1), (-8.6, -16.1))
            ThreePointArc((-8.6, -16.1), (-8.05, -16.65), (-8.6, -17.2))
            Line((-8.6, -17.2), (-15.715476742, -17.2))
            ThreePointArc((-15.715476742, -17.2), (-17.919238816, -17.919238816), (-17.2, -15.715476742))
            Line((-17.2, -15.715476742), (-17.2, -8.6))
            ThreePointArc((-17.2, -8.6), (-16.65, -8.05), (-16.1, -8.6))
            Line((-16.1, -8.6), (-16.1, -14))
            ThreePointArc((-16.1, -14), (-15.48492424, -15.48492424), (-14, -16.1))
        make_face()
        with BuildLine():
            Line((-16.1, 5.9), (-16.1, -5.9))
            ThreePointArc((-16.1, -5.9), (-16.65, -6.45), (-17.2, -5.9))
            Line((-17.2, -5.9), (-17.2, 5.9))
            ThreePointArc((-17.2, 5.9), (-16.65, 6.45), (-16.1, 5.9))
        make_face()
    extrude(amount=-CUT_EXTRUDE1_DEPTH, mode=Mode.SUBTRACT)


with BuildPart() as body_2:
    # FOV outline → FOV (revolve)
    with BuildSketch(Plane.XY):
        Polygon((863.25403634, 329.237781704), (3.999103893, 16.494562647), (4, 16.494562647), (863.254932447, 329.237781704), align=None)
    revolve(axis=Axis((0, 0, 0), (0, 1, 0)))


solid = Compound([part.part, body_2.part])
